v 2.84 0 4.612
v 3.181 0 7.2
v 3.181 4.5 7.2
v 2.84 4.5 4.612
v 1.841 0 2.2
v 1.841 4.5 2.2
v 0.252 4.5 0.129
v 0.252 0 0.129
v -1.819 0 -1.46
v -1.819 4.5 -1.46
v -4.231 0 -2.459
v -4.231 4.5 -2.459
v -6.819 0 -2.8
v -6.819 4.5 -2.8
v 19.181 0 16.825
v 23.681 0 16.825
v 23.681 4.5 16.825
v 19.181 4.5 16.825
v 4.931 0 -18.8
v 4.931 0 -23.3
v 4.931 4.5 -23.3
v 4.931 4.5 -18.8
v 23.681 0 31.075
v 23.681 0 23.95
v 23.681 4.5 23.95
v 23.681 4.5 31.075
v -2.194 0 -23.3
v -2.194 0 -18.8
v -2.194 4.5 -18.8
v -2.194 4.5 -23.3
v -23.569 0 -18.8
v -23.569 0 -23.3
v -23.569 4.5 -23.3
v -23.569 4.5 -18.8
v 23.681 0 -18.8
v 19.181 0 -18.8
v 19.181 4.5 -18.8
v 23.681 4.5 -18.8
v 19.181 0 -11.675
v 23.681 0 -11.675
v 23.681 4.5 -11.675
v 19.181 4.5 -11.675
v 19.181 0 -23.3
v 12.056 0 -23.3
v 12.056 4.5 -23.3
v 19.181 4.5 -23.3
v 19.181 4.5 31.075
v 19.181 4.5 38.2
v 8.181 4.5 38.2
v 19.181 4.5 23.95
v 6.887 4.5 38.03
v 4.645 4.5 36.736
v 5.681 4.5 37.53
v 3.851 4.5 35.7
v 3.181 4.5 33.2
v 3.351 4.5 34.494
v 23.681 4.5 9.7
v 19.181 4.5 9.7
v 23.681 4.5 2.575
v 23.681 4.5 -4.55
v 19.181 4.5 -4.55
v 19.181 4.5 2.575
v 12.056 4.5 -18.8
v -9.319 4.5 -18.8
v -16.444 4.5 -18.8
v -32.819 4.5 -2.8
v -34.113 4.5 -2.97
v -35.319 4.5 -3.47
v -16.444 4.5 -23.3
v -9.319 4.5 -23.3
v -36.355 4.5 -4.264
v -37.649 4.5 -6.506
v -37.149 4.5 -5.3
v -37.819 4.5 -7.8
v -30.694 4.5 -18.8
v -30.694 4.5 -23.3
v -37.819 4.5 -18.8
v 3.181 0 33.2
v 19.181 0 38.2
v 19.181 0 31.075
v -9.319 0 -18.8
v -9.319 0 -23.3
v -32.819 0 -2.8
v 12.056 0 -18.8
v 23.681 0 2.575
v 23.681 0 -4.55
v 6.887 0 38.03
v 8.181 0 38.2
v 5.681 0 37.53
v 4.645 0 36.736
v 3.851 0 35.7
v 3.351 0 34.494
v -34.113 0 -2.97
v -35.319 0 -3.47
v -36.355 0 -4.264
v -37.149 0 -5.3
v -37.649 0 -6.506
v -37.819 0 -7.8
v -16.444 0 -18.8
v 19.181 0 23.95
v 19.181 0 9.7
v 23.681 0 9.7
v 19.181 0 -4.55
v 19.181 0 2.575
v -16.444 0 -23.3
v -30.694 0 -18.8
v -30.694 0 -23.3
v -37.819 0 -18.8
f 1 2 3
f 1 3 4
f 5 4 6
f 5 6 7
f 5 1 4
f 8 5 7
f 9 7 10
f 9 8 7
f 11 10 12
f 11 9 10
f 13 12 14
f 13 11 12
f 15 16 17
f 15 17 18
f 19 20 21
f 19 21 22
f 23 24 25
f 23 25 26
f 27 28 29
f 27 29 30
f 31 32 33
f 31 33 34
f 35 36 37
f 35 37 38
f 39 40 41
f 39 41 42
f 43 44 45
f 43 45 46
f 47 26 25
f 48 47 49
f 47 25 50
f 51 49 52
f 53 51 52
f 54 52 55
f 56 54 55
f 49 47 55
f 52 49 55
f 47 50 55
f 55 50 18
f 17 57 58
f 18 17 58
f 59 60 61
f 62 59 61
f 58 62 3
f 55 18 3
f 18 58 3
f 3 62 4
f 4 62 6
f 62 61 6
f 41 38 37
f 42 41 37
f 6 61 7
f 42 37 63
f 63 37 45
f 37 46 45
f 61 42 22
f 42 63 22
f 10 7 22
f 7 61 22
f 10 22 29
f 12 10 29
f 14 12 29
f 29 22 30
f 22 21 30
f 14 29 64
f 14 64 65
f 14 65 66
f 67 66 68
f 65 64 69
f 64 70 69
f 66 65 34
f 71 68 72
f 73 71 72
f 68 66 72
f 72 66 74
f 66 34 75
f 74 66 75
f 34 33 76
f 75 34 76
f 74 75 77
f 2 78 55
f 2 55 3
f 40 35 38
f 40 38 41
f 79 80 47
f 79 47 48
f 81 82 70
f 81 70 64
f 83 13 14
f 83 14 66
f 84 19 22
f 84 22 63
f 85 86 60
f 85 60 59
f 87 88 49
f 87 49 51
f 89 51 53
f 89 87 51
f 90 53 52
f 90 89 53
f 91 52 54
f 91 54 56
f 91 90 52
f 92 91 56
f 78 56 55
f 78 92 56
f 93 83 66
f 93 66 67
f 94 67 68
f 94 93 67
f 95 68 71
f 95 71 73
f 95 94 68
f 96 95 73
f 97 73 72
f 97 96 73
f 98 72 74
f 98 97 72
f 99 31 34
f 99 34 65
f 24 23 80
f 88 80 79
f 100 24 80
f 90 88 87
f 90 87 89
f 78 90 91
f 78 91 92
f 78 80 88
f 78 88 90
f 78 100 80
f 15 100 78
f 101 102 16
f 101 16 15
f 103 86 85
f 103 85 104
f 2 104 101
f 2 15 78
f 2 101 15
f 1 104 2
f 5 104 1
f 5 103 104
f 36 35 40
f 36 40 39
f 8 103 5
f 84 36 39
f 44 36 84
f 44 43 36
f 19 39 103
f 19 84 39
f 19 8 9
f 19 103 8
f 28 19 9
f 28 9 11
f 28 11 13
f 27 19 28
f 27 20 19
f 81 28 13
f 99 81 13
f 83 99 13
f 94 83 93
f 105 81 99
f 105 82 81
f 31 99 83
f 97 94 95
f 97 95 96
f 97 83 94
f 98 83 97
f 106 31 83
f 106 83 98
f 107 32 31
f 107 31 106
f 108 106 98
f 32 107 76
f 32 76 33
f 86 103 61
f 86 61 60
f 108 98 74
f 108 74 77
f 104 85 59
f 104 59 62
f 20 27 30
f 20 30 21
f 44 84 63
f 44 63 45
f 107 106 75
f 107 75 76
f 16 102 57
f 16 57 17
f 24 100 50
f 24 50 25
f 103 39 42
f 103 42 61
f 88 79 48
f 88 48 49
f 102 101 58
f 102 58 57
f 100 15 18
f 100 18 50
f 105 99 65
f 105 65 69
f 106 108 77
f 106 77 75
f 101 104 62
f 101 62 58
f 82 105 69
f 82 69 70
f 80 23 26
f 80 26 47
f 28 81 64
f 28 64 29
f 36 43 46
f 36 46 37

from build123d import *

# Parameters (mm, degrees)
EXTRUDE_1_DEPTH = 4.5


with BuildPart() as part:
    # 草图1 → 凸台-拉伸1 (new body)
    with BuildSketch(Plane(origin=(0, 0, 0), x_dir=(1, 0, 0), z_dir=(0, 1, 0))):
        with BuildLine():
            Line((23.680785271, 18.799740126), (23.680785271, 11.674740126))
            Line((23.680785271, 11.674740126), (19.180785271, 11.674740126))
            Line((19.180785271, 11.674740126), (19.180785271, 4.549740126))
            Line((19.180785271, 4.549740126), (23.680785271, 4.549740126))
            Line((23.680785271, 4.549740126), (23.680785271, -2.575259874))
            Line((23.680785271, -2.575259874), (19.180785271, -2.575259874))
            Line((19.180785271, -2.575259874), (19.180785271, -9.700259874))
            Line((19.180785271, -9.700259874), (23.680785271, -9.700259874))
            Line((23.680785271, -9.700259874), (23.680785271, -16.825259874))
            Line((23.680785271, -16.825259874), (19.180785271, -16.825259874))
            Line((19.180785271, -16.825259874), (19.180785271, -23.950259874))
            Line((19.180785271, -23.950259874), (23.680785271, -23.950259874))
            Line((23.680785271, -23.950259874), (23.680785271, -31.075259874))
            Line((23.680785271, -31.075259874), (19.180785271, -31.075259874))
            Line((19.180785271, -31.075259874), (19.180785271, -38.200259874))
            Line((19.180785271, -38.200259874), (8.180785271, -38.200259874))
            ThreePointArc((8.180785271, -38.200259874), (4.645251365, -36.73579378), (3.180785271, -33.200259874))
            Line((3.180785271, -33.200259874), (3.180785271, -7.200259874))
            ThreePointArc((3.180785271, -7.200259874), (0.251853083, -0.129192062), (-6.819214729, 2.799740126))
            Line((-6.819214729, 2.799740126), (-32.819214729, 2.799740126))
            ThreePointArc((-32.819214729, 2.799740126), (-36.354748635, 4.26420622), (-37.819214729, 7.799740126))
            Line((-37.819214729, 7.799740126), (-37.819214729, 18.799740126))
            Line((-37.819214729, 18.799740126), (-30.694214729, 18.799740126))
            Line((-30.694214729, 18.799740126), (-30.694214729, 23.299740126))
            Line((-30.694214729, 23.299740126), (-23.569214729, 23.299740126))
            Line((-23.569214729, 23.299740126), (-23.569214729, 18.799740126))
            Line((-23.569214729, 18.799740126), (-16.444214729, 18.799740126))
            Line((-16.444214729, 18.799740126), (-16.444214729, 23.299740126))
            Line((-16.444214729, 23.299740126), (-9.319214729, 23.299740126))
            Line((-9.319214729, 23.299740126), (-9.319214729, 18.799740126))
            Line((-9.319214729, 18.799740126), (-2.194214729, 18.799740126))
            Line((-2.194214729, 18.799740126), (-2.194214729, 23.299740126))
            Line((-2.194214729, 23.299740126), (4.930785271, 23.299740126))
            Line((4.930785271, 23.299740126), (4.930785271, 18.799740126))
            Line((4.930785271, 18.799740126), (12.055785271, 18.799740126))
            Line((12.055785271, 18.799740126), (12.055785271, 23.299740126))
            Line((12.055785271, 23.299740126), (19.180785271, 23.299740126))
            Line((19.180785271, 23.299740126), (19.180785271, 18.799740126))
            Line((19.180785271, 18.799740126), (23.680785271, 18.799740126))
        make_face()
    extrude(amount=EXTRUDE_1_DEPTH)


solid = part.part
